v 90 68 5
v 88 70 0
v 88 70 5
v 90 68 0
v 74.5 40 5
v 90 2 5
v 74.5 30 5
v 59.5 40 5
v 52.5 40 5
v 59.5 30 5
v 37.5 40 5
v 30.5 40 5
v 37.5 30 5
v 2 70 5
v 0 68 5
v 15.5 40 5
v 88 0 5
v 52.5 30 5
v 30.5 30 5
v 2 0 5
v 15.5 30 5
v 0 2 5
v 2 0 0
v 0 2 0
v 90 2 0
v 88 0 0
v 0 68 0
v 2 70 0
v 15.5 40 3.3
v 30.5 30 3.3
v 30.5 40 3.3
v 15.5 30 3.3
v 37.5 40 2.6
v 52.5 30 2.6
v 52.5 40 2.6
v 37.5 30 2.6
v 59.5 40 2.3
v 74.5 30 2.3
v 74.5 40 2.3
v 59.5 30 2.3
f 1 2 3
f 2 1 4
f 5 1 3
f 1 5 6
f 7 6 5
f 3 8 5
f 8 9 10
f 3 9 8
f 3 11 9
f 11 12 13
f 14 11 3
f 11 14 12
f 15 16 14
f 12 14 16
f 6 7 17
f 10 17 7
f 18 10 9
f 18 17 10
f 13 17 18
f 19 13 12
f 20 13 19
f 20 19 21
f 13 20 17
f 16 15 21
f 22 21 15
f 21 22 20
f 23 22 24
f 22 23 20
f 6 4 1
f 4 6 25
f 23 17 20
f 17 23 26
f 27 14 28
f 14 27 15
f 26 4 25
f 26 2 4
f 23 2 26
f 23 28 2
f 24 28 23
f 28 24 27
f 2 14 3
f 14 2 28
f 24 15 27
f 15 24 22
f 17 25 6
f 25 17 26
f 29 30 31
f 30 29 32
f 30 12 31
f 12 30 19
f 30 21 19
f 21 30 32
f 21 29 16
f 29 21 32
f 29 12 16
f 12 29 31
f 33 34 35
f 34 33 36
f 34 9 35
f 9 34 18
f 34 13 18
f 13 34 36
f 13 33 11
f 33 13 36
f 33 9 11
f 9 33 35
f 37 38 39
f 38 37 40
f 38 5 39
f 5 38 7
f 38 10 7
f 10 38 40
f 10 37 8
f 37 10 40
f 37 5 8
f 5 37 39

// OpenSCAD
$fn = 32;

// ----------------------------------------------------------------------
// Windowed plate: 3 voids, 90 x 70 x 5 mm
// ----------------------------------------------------------------------

// --- parameters (mm) ---
plate_l = 90;             // plate length, X
plate_w = 70;             // plate width, Y
plate_t = 5;              // plate thickness, Z
edge_margin = 12;         // wall from the plate edge to any window
windows = 3;              // number of windows in the row
win_l = 15;               // window length
win_w = 10;               // window width
win_pitch = 22;           // window pitch along X
depth_1 = 1.7;            // depth of void 1 (full thickness = through)
depth_2 = 2.4;            // depth of void 2 (full thickness = through)
depth_3 = 2.7;            // depth of void 3 (full thickness = through)
corner_c = 2;             // corner chamfer of the plate

profile = [[2, 0], [88, 0], [90, 2], [90, 68], [88, 70], [2, 70], [0, 68], [0, 2]];  // primary outline, 8 points, counter clockwise
void_1 = [[15.5, 30], [30.5, 30], [30.5, 40], [15.5, 40]];  // window 1 of the row, 4 points
void_2 = [[37.5, 30], [52.5, 30], [52.5, 40], [37.5, 40]];  // window 2 of the row, 4 points
void_3 = [[59.5, 30], [74.5, 30], [74.5, 40], [59.5, 40]];  // window 3 of the row, 4 points

// --- the one profile operation ---
difference() {
  linear_extrude(height = plate_t) polygon(points = profile);
  translate([0, 0, plate_t - depth_1])
    linear_extrude(height = depth_1 + 1) polygon(points = void_1);
  translate([0, 0, plate_t - depth_2])
    linear_extrude(height = depth_2 + 1) polygon(points = void_2);
  translate([0, 0, plate_t - depth_3])
    linear_extrude(height = depth_3 + 1) polygon(points = void_3);
}
